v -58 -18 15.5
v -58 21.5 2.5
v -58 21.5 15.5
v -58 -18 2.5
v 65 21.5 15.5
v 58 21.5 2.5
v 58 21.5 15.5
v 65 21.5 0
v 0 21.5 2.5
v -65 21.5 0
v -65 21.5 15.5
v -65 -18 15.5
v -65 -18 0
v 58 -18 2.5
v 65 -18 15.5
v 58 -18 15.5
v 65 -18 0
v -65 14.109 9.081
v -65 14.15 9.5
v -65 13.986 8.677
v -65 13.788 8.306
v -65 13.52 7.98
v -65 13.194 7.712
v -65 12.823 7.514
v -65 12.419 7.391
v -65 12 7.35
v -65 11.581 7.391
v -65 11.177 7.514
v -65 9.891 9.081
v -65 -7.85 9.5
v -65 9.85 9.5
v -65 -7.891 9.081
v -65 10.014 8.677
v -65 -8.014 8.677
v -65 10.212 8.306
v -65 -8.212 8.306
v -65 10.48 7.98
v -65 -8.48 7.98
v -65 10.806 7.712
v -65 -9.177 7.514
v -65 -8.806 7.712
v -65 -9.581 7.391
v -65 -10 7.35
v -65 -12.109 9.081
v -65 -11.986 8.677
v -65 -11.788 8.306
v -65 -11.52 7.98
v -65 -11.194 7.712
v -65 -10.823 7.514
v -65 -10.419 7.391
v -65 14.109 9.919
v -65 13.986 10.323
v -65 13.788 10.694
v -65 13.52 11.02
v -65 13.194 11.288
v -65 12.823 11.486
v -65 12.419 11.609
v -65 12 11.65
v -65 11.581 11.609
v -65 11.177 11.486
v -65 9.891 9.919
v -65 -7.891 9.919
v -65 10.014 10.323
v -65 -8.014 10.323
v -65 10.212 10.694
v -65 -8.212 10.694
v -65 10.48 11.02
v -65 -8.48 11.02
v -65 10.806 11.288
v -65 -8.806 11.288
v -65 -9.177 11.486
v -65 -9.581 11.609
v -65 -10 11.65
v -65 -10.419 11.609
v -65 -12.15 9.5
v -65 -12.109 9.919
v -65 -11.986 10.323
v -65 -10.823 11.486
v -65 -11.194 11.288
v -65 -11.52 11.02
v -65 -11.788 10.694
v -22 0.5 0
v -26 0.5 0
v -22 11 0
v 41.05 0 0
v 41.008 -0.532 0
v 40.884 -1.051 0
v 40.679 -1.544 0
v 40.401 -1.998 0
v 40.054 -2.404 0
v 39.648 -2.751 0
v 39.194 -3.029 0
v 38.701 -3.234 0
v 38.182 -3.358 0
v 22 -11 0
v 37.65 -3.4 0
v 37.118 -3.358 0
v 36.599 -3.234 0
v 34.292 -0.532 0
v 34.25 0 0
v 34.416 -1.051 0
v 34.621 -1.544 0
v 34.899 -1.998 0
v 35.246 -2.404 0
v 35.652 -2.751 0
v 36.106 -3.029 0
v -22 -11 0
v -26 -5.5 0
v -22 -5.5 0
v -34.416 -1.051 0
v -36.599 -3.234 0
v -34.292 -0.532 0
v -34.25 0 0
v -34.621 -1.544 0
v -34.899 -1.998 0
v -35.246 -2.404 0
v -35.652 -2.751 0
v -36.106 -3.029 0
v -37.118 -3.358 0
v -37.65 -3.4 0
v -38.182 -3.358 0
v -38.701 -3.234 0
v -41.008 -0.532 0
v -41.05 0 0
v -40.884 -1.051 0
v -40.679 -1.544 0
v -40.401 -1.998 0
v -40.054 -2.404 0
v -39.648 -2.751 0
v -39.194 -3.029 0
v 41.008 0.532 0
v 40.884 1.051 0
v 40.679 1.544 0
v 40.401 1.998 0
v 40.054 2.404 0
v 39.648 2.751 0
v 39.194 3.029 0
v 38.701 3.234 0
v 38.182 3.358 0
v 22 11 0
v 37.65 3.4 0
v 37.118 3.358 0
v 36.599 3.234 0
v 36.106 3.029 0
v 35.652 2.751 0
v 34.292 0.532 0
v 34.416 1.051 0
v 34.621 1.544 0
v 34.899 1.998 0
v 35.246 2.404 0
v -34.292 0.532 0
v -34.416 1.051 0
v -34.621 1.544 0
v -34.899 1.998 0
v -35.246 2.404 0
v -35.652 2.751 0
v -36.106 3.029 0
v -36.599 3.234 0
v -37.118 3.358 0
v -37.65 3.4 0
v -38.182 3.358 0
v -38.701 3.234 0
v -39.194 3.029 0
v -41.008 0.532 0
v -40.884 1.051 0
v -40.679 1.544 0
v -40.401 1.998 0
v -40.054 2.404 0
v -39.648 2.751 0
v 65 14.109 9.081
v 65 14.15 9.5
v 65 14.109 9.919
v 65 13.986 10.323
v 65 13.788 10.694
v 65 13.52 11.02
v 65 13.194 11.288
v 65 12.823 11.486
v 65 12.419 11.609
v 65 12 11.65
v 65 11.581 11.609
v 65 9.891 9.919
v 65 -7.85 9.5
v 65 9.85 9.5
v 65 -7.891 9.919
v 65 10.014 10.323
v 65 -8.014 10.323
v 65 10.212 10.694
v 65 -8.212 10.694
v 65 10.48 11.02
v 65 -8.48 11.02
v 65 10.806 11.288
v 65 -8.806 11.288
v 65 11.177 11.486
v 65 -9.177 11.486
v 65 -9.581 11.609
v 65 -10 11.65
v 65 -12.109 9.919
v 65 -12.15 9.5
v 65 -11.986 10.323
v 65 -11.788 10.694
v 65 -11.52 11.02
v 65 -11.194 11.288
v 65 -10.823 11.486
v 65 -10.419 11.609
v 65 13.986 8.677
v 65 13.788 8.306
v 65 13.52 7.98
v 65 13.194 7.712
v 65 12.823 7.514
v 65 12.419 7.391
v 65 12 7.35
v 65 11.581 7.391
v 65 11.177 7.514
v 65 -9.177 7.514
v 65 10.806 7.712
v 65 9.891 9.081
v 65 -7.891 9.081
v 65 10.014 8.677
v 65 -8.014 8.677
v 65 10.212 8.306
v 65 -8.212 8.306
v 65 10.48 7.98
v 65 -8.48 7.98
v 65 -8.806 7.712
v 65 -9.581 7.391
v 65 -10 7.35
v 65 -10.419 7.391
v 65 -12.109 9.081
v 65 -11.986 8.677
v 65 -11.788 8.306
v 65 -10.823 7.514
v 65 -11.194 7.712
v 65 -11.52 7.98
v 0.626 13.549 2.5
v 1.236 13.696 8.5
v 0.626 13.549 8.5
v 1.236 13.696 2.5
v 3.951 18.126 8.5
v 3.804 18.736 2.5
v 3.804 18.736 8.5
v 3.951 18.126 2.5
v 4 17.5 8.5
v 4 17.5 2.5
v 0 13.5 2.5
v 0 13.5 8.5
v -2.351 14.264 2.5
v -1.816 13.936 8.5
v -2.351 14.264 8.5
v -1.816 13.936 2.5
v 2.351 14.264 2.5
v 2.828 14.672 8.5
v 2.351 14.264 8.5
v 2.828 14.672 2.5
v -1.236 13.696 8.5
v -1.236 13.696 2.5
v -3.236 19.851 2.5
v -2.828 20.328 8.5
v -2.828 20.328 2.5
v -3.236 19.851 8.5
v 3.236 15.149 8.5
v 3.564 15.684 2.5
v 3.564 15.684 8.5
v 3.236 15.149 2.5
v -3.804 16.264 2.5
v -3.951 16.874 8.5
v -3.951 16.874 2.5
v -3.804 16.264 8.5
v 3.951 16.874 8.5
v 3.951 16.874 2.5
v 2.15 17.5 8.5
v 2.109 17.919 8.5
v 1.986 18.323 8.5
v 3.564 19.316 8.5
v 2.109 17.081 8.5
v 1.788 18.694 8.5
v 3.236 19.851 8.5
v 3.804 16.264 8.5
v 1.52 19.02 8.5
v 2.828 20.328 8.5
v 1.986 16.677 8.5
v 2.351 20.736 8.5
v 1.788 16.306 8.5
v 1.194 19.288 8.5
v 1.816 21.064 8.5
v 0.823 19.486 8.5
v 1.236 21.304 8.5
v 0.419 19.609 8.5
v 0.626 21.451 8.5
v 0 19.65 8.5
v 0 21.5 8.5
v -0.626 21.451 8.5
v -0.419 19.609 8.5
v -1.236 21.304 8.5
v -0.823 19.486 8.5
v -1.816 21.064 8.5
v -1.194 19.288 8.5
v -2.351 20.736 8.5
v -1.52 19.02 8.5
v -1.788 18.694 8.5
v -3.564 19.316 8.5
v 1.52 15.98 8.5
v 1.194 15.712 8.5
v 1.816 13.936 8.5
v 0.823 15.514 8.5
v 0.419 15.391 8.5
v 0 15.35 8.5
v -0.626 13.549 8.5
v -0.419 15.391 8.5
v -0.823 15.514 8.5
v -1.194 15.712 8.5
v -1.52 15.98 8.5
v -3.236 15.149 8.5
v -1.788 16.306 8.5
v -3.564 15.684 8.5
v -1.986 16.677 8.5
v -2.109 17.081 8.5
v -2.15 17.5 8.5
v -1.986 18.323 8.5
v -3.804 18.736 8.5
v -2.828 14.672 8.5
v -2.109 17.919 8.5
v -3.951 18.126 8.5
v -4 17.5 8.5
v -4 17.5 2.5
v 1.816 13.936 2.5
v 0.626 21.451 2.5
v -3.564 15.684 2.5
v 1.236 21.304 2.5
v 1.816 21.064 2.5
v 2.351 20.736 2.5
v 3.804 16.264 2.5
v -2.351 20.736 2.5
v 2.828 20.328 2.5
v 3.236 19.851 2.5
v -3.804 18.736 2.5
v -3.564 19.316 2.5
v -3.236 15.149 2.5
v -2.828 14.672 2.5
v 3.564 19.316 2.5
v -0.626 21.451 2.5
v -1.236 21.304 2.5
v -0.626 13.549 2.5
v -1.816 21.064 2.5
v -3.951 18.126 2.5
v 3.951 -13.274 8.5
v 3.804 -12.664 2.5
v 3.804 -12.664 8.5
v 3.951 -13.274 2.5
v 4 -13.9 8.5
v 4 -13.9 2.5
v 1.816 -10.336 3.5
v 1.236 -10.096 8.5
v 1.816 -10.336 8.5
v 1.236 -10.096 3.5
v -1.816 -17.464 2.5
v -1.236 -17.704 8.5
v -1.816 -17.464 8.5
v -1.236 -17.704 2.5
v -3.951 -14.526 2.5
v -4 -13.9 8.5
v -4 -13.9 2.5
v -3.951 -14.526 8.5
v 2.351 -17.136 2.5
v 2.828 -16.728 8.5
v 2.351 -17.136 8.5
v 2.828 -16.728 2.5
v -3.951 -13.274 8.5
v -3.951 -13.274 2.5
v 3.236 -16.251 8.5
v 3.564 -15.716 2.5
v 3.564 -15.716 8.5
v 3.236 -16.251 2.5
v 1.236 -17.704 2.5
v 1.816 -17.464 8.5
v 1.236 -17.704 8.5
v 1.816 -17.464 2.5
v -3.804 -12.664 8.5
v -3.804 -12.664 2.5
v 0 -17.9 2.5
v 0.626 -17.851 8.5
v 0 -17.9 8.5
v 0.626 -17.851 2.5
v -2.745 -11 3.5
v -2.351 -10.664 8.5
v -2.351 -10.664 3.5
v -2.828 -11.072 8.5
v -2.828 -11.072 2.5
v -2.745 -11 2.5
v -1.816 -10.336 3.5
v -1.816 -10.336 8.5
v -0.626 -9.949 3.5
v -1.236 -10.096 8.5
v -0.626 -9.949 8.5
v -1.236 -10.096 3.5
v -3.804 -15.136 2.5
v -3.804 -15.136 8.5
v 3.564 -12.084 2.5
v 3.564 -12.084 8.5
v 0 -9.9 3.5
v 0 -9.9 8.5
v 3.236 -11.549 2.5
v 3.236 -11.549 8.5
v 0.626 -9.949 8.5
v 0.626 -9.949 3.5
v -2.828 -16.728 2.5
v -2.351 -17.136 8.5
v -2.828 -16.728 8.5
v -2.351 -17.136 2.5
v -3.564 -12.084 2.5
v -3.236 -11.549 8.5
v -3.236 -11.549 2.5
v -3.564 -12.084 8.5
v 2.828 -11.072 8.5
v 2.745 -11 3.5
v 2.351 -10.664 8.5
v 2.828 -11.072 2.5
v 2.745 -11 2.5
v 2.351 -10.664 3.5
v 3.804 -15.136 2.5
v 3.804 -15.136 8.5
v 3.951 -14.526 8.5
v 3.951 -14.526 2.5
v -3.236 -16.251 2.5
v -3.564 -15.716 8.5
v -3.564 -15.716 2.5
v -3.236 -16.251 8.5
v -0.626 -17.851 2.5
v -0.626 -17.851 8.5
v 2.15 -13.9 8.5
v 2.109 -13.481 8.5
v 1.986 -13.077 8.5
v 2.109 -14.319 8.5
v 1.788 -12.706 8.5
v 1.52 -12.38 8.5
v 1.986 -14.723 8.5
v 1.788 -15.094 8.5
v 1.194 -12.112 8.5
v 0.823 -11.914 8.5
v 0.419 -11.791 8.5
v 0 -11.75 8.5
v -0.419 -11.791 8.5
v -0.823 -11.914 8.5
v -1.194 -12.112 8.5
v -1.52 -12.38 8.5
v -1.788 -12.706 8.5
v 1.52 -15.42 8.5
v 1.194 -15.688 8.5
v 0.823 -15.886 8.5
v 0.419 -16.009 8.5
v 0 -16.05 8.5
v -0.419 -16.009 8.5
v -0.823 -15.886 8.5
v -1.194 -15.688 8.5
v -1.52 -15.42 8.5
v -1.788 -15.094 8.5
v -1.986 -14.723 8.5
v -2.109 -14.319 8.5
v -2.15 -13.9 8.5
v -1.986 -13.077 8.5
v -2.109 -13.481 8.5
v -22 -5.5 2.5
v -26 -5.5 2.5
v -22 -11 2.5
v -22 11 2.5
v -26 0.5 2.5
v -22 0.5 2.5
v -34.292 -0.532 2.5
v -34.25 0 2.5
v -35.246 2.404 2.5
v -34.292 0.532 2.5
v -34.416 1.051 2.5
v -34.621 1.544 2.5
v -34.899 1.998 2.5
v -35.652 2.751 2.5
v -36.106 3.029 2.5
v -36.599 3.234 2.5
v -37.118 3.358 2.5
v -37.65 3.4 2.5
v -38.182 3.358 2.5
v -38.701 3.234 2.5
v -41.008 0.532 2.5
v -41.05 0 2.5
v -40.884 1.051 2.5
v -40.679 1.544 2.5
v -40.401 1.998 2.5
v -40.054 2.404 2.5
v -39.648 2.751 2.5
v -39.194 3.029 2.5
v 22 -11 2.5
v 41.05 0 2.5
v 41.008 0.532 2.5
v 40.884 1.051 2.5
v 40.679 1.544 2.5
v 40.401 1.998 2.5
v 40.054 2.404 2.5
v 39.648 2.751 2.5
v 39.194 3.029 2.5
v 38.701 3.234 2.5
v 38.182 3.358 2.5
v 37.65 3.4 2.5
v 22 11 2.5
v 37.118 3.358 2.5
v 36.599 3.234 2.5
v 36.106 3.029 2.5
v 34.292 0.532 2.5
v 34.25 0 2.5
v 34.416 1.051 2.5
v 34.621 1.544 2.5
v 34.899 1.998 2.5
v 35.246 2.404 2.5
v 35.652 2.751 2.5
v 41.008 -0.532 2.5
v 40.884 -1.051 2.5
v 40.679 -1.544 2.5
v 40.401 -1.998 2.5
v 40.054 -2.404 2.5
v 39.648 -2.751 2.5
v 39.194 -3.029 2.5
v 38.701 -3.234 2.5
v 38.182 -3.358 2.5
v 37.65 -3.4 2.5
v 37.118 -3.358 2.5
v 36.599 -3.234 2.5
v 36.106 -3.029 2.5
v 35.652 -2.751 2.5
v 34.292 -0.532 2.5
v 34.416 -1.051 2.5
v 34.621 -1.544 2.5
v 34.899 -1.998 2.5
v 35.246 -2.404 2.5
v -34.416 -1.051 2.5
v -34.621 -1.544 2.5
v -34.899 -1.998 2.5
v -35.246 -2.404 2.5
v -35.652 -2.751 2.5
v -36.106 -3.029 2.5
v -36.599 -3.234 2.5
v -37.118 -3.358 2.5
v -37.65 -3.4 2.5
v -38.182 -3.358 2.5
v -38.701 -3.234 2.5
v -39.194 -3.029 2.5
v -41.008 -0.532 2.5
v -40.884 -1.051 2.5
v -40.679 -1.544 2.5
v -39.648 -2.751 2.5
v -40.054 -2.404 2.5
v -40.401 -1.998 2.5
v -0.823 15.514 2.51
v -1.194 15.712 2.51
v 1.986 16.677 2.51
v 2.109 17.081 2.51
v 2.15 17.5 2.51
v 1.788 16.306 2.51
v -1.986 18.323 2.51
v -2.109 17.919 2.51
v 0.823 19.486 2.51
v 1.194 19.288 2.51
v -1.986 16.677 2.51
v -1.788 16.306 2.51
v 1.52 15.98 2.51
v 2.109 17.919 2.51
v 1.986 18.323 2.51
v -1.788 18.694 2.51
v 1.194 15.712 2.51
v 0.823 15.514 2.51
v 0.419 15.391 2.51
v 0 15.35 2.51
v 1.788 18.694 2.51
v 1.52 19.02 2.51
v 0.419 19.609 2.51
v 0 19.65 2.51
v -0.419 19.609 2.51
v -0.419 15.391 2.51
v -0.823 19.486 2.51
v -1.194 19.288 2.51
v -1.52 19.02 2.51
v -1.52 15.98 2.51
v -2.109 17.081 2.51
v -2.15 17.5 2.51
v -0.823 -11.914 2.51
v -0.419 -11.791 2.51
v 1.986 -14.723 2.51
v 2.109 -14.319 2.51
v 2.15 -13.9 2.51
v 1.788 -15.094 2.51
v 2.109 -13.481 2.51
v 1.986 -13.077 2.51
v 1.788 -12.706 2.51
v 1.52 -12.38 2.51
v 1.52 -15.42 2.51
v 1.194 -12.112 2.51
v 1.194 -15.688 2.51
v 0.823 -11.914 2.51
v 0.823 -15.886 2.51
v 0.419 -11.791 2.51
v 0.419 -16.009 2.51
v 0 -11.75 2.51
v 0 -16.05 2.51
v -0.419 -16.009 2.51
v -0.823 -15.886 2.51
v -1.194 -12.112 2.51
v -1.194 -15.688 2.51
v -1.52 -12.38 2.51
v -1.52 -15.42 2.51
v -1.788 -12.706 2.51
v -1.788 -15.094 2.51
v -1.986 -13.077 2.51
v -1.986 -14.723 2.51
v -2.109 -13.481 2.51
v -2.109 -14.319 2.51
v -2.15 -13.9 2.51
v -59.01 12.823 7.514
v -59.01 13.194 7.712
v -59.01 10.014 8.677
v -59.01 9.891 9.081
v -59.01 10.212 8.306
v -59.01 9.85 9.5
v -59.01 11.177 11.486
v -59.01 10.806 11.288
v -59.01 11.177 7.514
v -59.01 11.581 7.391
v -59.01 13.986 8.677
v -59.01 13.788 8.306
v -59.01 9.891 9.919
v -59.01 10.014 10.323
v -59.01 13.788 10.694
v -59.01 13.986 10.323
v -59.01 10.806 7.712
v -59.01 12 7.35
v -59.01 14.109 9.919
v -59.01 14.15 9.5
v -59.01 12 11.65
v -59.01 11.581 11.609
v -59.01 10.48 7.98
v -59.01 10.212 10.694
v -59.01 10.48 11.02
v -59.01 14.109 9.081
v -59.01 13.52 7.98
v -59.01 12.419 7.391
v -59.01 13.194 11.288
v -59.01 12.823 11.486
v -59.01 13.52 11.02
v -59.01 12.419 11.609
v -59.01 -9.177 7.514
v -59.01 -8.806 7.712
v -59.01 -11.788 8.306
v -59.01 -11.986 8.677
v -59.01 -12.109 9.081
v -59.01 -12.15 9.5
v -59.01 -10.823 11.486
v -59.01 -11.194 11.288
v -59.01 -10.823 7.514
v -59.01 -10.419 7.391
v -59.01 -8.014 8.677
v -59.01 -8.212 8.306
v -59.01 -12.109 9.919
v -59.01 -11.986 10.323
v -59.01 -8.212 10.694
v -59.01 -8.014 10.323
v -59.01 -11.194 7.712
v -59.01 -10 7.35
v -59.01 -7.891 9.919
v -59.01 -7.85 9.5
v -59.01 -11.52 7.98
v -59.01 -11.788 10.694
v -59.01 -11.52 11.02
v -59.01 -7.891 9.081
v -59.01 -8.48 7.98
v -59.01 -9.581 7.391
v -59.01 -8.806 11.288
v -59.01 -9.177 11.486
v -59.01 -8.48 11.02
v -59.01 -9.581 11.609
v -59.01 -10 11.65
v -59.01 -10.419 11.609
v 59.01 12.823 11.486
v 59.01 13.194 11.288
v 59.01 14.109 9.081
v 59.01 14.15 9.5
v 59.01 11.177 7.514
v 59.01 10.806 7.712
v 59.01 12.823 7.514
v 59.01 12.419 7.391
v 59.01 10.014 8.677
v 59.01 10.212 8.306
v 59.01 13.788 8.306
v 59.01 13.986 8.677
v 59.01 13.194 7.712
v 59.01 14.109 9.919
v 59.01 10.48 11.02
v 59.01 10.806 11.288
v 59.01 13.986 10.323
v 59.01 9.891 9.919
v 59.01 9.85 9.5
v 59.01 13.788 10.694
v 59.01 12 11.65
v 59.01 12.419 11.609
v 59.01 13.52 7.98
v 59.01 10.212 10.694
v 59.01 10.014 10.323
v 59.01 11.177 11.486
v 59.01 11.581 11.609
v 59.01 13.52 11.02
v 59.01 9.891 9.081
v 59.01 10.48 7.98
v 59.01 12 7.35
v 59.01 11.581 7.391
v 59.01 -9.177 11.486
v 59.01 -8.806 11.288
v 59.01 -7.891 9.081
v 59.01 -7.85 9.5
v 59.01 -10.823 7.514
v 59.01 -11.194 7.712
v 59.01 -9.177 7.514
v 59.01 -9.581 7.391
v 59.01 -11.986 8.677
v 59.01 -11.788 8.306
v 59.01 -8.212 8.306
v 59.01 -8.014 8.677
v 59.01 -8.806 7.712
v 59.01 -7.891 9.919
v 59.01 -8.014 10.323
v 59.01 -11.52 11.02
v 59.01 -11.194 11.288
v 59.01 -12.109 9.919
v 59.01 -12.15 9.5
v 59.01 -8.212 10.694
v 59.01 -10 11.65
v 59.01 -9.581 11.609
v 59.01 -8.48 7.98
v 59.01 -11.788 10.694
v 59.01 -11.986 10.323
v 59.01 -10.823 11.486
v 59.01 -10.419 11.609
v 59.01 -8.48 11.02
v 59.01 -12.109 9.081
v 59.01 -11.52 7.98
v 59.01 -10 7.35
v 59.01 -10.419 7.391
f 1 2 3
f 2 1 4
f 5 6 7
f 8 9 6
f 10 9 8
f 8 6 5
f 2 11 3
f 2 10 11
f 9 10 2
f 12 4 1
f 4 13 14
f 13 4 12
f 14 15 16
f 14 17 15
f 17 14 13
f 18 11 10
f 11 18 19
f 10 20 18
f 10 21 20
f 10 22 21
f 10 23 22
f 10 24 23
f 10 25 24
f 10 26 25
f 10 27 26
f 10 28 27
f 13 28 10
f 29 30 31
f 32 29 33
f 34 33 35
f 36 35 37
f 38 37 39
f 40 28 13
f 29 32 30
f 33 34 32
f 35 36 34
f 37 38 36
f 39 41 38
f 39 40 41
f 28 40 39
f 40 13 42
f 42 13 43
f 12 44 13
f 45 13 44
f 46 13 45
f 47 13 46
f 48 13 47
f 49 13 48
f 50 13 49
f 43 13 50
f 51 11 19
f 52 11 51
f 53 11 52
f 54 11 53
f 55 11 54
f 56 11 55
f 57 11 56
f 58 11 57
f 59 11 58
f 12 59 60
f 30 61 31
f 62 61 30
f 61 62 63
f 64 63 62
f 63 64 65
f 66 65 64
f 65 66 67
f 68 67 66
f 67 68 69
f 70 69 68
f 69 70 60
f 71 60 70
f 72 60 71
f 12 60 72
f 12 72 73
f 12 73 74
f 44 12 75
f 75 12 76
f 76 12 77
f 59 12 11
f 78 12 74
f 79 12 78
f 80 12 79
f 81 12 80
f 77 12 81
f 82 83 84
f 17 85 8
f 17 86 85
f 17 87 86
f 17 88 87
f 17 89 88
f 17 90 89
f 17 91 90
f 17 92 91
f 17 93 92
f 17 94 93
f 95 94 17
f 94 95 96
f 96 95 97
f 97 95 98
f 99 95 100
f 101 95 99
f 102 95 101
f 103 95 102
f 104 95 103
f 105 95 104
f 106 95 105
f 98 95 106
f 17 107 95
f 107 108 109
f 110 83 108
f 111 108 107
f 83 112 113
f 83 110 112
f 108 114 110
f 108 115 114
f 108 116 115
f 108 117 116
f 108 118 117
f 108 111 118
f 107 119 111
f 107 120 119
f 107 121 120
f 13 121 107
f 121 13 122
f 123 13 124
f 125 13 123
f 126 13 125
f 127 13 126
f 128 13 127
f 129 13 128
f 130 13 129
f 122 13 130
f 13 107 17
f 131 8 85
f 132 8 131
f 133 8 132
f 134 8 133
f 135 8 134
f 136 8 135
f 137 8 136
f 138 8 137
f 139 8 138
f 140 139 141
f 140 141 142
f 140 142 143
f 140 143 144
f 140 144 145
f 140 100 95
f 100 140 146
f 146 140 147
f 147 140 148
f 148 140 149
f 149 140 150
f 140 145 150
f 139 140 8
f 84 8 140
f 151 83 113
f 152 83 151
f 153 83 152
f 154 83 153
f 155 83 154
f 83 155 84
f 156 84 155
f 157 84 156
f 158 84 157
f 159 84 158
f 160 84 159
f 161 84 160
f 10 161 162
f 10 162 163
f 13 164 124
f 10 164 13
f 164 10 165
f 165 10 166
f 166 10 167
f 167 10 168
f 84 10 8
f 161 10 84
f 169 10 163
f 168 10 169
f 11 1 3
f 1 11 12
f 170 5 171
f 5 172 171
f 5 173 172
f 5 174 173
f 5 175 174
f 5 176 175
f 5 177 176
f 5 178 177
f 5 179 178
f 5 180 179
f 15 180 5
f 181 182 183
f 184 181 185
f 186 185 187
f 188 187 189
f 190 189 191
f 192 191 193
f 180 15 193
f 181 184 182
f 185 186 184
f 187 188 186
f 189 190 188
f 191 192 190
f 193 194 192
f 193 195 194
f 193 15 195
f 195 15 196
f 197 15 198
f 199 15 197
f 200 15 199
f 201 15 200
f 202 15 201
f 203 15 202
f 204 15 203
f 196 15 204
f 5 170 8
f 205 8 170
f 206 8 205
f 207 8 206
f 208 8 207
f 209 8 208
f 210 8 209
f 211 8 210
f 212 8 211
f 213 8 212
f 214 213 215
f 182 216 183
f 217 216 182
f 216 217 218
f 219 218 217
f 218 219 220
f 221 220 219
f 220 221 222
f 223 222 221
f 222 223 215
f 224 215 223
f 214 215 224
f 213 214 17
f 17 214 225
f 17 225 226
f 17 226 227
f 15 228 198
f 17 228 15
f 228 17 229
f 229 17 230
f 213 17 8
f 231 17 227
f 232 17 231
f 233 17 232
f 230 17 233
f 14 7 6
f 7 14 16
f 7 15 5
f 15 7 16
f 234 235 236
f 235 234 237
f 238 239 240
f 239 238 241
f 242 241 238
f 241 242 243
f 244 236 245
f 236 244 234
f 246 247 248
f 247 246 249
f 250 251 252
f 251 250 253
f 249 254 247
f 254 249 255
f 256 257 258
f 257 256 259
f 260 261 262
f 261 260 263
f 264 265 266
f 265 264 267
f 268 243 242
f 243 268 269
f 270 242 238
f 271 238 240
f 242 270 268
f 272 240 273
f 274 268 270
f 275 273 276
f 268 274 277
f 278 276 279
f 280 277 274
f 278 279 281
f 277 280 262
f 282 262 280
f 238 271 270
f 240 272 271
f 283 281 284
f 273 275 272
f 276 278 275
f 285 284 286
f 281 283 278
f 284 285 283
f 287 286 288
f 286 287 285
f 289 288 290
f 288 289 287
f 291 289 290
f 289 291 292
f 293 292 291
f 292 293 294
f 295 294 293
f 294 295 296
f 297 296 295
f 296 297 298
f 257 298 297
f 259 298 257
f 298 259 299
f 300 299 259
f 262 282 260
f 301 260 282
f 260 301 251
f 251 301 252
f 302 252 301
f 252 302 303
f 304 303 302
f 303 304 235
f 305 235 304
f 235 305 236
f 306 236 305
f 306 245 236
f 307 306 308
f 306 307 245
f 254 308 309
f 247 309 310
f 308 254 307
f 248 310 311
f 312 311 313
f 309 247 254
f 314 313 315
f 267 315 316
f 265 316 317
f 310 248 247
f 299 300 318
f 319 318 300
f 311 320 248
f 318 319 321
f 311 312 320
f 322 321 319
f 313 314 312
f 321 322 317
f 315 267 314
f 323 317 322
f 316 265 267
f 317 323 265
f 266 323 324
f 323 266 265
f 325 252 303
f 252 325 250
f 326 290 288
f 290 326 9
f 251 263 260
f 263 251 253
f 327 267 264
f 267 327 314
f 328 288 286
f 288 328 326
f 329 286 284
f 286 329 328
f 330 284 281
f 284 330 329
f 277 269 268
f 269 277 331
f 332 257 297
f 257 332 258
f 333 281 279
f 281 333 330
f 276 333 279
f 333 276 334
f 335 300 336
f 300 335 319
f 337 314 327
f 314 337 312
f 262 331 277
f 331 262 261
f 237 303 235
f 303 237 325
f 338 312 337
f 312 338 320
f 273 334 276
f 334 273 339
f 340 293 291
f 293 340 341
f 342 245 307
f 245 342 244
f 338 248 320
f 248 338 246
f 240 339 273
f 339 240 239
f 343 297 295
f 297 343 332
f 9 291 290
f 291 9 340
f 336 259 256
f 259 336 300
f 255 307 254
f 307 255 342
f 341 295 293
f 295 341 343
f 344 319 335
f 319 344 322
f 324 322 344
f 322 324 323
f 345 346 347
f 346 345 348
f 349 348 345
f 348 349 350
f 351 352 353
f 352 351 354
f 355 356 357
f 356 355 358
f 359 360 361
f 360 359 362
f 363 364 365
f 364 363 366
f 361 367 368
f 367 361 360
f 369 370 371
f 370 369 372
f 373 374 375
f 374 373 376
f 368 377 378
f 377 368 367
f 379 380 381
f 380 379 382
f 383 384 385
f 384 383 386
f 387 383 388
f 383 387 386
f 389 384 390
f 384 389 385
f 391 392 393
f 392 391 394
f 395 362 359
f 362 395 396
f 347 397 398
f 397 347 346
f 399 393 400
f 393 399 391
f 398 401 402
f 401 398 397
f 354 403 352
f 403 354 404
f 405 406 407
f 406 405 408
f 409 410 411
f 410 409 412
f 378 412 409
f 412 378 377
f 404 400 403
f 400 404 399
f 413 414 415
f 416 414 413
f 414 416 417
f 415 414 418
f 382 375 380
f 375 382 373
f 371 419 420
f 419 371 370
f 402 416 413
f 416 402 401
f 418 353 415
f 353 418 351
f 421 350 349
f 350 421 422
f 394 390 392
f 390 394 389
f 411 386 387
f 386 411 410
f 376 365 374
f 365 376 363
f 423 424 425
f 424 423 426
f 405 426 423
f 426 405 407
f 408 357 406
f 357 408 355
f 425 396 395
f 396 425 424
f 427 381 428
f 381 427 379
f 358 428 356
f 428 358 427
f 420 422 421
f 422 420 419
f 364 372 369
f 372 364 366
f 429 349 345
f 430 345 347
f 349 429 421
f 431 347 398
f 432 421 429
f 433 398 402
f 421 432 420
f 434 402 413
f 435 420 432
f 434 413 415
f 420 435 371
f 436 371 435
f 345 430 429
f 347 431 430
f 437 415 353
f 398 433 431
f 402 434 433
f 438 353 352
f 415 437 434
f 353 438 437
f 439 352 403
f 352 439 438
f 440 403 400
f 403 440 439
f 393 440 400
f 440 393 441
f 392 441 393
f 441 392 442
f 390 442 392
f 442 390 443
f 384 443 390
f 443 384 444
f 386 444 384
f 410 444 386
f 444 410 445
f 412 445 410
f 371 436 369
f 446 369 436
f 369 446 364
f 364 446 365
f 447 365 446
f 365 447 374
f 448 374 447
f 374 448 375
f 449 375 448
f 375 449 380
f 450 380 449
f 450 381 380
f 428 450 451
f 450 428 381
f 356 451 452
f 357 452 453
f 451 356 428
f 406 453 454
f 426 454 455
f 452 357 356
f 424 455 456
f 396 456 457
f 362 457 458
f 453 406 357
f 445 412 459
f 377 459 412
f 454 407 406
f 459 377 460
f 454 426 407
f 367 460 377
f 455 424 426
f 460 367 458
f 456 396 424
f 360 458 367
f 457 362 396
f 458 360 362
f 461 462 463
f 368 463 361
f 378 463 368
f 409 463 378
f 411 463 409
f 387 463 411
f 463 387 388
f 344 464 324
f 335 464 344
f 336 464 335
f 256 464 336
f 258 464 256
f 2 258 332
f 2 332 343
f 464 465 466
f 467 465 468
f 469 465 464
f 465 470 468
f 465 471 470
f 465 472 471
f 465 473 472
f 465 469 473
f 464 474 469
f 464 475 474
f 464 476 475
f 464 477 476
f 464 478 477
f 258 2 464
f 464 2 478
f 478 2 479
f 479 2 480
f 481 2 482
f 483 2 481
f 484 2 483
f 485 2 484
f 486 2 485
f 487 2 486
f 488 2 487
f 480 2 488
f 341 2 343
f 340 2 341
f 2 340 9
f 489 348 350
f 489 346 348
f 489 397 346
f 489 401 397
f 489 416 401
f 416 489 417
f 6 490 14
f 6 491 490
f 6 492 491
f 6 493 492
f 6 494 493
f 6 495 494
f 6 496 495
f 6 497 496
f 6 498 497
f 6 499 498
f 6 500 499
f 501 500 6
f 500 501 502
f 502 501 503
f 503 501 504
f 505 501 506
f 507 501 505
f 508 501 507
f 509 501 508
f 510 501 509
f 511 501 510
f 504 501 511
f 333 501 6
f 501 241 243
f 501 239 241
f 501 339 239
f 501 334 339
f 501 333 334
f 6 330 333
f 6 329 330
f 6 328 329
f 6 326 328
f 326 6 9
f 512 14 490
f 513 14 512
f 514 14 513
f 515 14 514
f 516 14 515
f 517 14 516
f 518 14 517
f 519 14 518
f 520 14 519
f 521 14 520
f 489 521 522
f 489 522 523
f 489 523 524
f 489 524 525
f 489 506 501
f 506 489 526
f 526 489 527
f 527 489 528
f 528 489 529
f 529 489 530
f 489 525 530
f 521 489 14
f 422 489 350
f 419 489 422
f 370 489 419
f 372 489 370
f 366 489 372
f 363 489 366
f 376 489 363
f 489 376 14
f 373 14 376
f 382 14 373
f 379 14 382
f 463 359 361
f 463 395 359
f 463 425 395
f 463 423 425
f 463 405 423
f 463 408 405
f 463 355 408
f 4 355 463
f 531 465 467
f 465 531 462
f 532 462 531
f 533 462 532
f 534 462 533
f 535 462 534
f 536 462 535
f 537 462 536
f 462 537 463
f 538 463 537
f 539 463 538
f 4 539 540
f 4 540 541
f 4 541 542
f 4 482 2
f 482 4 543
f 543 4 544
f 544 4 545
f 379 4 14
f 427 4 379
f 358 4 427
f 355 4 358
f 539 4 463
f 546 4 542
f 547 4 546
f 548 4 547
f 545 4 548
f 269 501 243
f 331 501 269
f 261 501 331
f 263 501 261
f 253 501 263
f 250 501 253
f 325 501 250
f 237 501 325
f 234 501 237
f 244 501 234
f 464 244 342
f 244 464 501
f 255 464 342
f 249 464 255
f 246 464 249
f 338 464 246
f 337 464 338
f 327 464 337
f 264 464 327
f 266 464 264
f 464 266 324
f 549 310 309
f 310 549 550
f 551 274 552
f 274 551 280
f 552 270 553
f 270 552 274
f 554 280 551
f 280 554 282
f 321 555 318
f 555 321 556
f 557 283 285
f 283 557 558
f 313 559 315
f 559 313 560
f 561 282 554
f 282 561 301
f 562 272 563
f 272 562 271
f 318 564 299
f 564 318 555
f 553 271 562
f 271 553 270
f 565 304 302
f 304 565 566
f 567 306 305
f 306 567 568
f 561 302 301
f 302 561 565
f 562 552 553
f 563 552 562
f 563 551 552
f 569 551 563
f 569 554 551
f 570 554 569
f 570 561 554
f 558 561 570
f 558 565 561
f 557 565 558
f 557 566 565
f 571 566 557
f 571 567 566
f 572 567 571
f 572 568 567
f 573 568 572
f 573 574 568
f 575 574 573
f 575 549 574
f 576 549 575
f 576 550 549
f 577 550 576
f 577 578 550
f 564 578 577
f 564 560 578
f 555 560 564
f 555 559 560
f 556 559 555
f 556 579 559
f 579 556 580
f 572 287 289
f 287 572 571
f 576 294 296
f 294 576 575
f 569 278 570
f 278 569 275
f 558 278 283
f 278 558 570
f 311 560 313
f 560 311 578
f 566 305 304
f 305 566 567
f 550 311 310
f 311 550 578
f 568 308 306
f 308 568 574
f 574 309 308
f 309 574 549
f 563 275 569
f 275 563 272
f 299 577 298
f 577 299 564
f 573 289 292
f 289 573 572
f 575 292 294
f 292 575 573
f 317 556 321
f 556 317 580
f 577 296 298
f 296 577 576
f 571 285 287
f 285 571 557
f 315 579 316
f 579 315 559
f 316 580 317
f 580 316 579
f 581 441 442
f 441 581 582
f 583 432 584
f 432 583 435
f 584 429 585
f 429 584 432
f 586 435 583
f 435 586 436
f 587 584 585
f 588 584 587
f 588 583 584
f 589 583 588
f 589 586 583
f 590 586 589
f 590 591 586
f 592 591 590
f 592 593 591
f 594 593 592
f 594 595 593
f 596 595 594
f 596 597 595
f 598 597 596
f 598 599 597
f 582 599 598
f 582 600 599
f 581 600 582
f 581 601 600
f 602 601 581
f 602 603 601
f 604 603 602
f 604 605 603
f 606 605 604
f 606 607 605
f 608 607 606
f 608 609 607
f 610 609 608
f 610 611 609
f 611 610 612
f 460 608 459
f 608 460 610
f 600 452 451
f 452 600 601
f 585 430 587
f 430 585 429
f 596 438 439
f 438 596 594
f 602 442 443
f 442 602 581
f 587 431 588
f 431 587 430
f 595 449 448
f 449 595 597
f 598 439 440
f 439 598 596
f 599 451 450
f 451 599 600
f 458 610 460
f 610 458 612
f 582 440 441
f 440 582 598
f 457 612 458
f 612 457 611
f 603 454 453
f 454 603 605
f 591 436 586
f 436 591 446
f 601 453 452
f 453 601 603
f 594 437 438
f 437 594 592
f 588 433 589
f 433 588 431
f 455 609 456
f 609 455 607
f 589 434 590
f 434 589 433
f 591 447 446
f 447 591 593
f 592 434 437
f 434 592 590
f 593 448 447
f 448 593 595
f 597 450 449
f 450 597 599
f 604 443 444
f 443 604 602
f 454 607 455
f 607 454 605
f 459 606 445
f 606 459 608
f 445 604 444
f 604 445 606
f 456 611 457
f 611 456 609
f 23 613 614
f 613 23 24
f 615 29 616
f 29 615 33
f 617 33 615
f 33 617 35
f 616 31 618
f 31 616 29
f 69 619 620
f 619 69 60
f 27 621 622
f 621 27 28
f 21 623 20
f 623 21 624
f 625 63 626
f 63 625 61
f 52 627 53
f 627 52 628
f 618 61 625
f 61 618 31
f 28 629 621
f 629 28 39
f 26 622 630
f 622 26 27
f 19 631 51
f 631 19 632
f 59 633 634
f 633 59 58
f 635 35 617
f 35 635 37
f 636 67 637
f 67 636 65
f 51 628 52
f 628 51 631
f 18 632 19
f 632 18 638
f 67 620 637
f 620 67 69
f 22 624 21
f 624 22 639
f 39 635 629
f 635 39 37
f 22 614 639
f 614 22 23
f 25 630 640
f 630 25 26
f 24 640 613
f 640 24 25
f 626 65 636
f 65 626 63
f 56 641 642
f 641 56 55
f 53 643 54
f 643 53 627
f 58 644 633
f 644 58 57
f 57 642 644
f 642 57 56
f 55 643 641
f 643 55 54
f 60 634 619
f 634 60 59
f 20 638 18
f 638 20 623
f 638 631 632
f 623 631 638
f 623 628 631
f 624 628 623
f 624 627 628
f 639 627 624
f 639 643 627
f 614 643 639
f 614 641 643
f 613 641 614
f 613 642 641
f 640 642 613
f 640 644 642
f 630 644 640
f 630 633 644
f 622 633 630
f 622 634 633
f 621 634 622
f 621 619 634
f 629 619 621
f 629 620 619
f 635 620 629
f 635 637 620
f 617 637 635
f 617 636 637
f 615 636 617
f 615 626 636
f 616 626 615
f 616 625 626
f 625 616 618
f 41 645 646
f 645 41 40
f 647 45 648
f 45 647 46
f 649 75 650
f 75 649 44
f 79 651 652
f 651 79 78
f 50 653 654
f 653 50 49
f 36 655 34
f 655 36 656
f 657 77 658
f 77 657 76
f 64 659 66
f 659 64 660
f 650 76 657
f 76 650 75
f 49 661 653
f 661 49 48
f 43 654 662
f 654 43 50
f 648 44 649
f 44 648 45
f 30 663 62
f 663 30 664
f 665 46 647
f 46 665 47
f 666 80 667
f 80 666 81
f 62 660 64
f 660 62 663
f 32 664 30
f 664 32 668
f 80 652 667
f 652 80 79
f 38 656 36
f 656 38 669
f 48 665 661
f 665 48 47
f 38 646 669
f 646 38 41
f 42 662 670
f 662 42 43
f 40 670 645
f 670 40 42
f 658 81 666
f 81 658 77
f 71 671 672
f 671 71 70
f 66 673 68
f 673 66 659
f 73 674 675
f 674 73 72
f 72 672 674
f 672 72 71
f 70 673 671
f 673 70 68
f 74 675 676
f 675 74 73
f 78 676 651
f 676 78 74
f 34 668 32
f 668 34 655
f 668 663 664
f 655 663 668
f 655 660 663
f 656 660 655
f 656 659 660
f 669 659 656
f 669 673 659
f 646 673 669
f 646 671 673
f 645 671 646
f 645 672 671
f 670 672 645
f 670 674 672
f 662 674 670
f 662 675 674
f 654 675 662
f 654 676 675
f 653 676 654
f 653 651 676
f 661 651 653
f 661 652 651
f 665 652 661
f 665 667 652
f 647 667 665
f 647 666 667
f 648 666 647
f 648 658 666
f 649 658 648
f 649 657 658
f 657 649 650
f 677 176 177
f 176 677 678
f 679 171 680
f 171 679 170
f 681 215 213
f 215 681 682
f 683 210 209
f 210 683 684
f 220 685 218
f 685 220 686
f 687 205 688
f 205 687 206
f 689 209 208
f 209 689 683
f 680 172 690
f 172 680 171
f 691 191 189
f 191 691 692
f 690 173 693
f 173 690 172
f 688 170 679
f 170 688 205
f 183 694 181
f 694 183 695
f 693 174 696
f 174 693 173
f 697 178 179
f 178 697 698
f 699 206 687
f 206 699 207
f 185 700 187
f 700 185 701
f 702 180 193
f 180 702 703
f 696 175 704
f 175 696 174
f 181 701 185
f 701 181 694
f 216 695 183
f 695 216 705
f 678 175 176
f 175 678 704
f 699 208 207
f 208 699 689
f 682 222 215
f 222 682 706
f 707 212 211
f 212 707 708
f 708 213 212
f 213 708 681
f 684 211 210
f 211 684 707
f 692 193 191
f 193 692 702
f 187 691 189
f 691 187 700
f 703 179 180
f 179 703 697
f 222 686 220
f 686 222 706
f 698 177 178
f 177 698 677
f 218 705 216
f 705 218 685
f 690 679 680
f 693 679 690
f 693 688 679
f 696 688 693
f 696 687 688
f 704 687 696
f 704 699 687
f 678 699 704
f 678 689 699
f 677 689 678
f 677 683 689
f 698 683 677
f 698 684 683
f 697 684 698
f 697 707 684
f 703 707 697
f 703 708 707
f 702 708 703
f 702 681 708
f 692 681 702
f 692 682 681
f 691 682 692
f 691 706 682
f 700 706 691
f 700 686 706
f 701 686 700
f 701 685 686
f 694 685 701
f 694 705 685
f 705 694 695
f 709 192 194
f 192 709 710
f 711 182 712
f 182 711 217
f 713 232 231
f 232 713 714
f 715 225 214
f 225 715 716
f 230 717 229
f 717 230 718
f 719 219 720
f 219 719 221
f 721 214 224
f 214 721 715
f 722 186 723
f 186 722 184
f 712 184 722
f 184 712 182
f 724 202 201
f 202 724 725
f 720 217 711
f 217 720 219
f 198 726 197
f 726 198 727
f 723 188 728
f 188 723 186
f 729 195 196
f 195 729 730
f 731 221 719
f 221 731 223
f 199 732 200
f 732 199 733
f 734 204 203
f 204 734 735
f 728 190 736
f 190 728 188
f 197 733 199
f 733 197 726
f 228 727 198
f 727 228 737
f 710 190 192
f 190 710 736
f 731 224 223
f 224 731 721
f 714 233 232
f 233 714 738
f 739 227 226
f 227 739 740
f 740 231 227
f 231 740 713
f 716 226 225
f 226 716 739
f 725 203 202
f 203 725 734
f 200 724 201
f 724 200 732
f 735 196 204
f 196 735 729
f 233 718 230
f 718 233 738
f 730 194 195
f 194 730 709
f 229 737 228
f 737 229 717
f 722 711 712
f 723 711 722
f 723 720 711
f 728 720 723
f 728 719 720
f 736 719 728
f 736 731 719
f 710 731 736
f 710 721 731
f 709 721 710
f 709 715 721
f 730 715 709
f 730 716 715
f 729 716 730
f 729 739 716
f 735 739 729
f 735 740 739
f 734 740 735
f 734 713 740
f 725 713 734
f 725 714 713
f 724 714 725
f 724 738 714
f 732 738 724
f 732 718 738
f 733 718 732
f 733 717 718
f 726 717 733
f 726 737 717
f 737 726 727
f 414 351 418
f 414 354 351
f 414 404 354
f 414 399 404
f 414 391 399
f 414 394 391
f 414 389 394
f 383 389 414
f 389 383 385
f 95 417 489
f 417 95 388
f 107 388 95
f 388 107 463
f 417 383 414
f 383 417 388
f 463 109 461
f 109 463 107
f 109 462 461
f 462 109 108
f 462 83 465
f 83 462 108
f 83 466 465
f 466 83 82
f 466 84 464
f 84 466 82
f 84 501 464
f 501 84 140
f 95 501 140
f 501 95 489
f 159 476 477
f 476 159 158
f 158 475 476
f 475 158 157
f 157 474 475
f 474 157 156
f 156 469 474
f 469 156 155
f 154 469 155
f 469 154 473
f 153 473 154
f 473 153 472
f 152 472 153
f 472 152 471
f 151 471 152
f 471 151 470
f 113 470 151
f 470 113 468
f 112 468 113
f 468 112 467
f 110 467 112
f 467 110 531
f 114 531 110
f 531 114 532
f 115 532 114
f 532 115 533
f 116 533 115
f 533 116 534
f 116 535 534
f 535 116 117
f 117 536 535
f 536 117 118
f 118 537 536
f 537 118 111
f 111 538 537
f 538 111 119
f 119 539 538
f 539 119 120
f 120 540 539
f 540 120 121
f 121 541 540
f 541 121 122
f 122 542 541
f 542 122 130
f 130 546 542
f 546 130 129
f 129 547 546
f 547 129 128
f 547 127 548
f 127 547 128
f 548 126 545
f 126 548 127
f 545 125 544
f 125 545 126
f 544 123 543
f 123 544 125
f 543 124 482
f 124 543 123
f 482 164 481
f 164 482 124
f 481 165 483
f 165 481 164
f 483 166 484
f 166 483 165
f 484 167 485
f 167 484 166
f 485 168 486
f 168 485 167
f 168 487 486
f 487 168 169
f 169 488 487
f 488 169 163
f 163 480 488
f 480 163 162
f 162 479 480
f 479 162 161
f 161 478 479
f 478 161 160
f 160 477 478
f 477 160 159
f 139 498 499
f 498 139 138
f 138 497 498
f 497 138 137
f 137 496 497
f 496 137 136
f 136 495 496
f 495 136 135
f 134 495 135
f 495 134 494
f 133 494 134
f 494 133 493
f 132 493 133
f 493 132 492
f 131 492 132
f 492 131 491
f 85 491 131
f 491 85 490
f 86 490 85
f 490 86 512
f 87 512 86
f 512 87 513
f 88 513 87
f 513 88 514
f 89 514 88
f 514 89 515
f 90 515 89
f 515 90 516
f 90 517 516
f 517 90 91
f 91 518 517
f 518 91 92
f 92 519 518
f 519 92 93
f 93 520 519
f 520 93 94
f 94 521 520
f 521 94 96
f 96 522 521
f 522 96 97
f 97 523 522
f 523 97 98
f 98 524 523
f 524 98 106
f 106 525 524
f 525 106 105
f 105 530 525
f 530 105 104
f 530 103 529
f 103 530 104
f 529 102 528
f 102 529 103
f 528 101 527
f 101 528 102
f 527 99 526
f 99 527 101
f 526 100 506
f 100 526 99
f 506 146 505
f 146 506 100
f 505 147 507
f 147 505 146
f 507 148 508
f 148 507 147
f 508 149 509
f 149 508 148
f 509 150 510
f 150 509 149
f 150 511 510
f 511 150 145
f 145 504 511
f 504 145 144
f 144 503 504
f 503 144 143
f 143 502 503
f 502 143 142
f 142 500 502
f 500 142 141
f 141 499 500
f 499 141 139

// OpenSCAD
// file: ../../head.scad
// Head - shared dimensions for the face plate, shell, camera plate and floor (concept:
// concepts/head_brow_concept.scad). The head sits straight on the turntable plate, no neck.
//
// Frame: origin at the centre of the turntable plate's top; +Y = front (face), +Z = up.
//
//   FACE   head_face.scad: the front of the box part - two round GC9A01 eyes and the 2.08" OLED
//          mouth, each dropped into a pocket from behind (it centres them) and hot-glued
//   SHELL  head_shell.scad: sides, back and the ARCH on top (a half cylinder across the full width
//          and depth); the camera looks out of a small window in the arch's front curve
//   CAMERA head_cam_plate.scad: holds the bare C920 board at cam_tilt, screwed inside the arch
//   FLOOR  head_floor.scad: screws to the turntable plate; the head ESP32-S3 sits on it
include <params.scad>

// ---- outline ------------------------------------------------------------------------------------
hb_w     = 135;              // width (X)
hb_d     = 70;               // depth (Y)
box_h    = 88;               // the box part (face height); the arch adds arch_r on top -> 123
hb_r     = 20;               // bottom corners, seen from the front (the top meets the arch square)
hb_wall  = 2.5;              // shell walls
arch_r   = hb_d / 2;         // 35: the arch spans the full depth; its axis runs along X at
arch_z   = box_h;            //   y = 0, z = box_h
face_t   = 3.0;              // face plate
face_y   = hb_d / 2;         // 35: front surface of the face

// ---- eyes (module dims: params.scad eye_*) ------------------------------------------------------
eye_dx    = 32;              // eye centres at x = +/- eye_dx
eye_z     = 55;              // eye centre height. Modules mount UPSIDE DOWN (pin tab up; the image
                             //   is flipped in software): the tab then points into the free space
                             //   under the arch, away from the mouth
eye_win   = 34;              // window: the 32.4 mm picture + a thin black margin of glass; hides the
                             //   glass edge and its flex cable
eye_skin  = 1.2;             // face material in front of the display
eye_pocket = eye_board_d + 0.5;     // the board drops into this and centres the display
eye_depth = eye_t + 0.3;     // pocket depth behind the skin

// ---- mouth: 2.08" OLED (params.scad oled_*) ---------------------------------------------------------
mouth_z   = 23;              // centre of the visible area: the module's lower edge clears the floor's tabs
mouth_pin = -1;              // the module's pin end points to -X (seen from the front: the left)
m_win     = oled_va + [0.6, 0.6];   // window: the visible area + 0.3 each side
m_skin    = 1.2;
// along X, from the visible area's centre: the glass's and the board's centres (pins at -X)
m_glass_dx = -mouth_pin * (oled_glass_x + oled_glass[0] / 2 - (oled_va_x + oled_va[0] / 2));   // +2.56
m_pcb_dx   = -mouth_pin * (oled_pcb[0] / 2 - (oled_va_x + oled_va[0] / 2));                     // +1.82

// ---- camera: bare C920 board, in the arch ----------------------------------------------------------
cam_tilt  = 18;              // fixed, up. Lens ~278 mm above the desk: eyes 300-500 mm high at
                             //   300-600 mm are 2..37 deg up; the 43 deg view (16:9) at 18 covers -3..40
cam_board = [80, 22];        // MEASURED (eye_test_stand.scad)
cam_board_t = 1.3;
cam_lens_h  = 14.0;          // board front -> front of the lens
cam_lens_d  = 11;            // lens barrel across its flanges
cam_win     = cam_lens_d + 2 * 2;   // window round the lens (eye test stand, print 2: small is best)
cam_recess  = 0.5;           // lens front this far inside the arch's surface
// the lens axis runs radially out of the arch at cam_tilt: lens front at arch_r - cam_recess
cam_r_lens  = arch_r - cam_recess;                  // 34.5 from the arch axis
cam_r_board = cam_r_lens - cam_lens_h;              // 20.5: board front

// ---- joints -------------------------------------------------------------------------------------------
// face plate -> shell: four M3 screws from inside, through tabs on the shell, into inserts in the
// face's bosses
face_boss_d   = 8;
face_boss_len = 9;           // behind the face's back
face_bosses   = [[-55, 14], [55, 14], [-58, 64], [58, 64]];   // (x, z): the upper pair low enough to
                                                                //   clear the camera plate's flanges

// floor: head_floor.scad. It screws DOWN into four inserts in the turntable plate (head-frame
// positions below); the shell hooks onto it at the front (two tongues on the face plate into slots
// in the floor's front tabs) and screws to it at the back (two M3 through the back wall)
floor_t      = 4.5;          // pockets underneath clear the lazy Susan's M5 nuts + bolt tips
floor_clr    = 0.4;          // gap to the shell's walls, each side
floor_x      = 47;           // half-width: the shell's open bottom is +/-47.5 (rounded corners)
floor_y      = [-hb_d / 2 + hb_wall + floor_clr, face_y - face_t - floor_clr];
floor_mounts = [[-22, -22], [22, -22], [-22, 22], [22, 22]];  // M3 down into the turntable plate
head_rot_in_pulley = 45;     // the head's frame in turntable_pulley.scad's: there the motor is at 0 deg
                             //   when the head looks ahead, and Level 2 has it at motor_a = -45, so the
                             //   head's +Y (90 deg) is at 135
floor_nuts   = [[-50.5, 0], [50.5, 0]];   // the turntable plate's M5 nuts under the floor
floor_hole_d = 40;           // cables down into the turntable's hollow tube
back_screws  = [-30, 30];    // x of the two M3 screws through the back wall
back_screw_z = 10;
tongue_x     = [-30, 30];    // the face plate's tongues
tongue       = [10, 3, 7];   // width (X), height (Z), length (Y, back from the face plate)
tongue_z     = 7;            // centre height (under the mouth's collar)
// the head ESP32-S3 (Seeed XIAO ESP32S3, 21 x 17.8): in a pocket on the floor, USB-C toward the hole
mcu          = [21.0, 17.8];
mcu_c        = [33, 0];      // centre; long axis along X, USB at the -X end

module rr2d(w, h, r) { offset(r = r) square([w - 2 * r, h - 2 * r], center = true); }

// front outline of the box part: rounded bottom corners, square top; z = 0 .. h
module low2d(w = hb_w, h = box_h, r = hb_r) {
    hull() {
        for (sx = [-1, 1]) translate([sx * (w / 2 - r), r]) circle(r = r, $fn = 96);
        translate([-w / 2, h - 1]) square([w, 1]);
    }
}

// where the lens sits: frame at the lens front, looking along +Y (rotated cam_tilt up)
module at_lens() {
    translate([0, 0, arch_z]) rotate([cam_tilt, 0, 0]) translate([0, cam_r_lens, 0]) children();
}
// file: ../../head_cam.scad
// Head camera mount - shared by head_cam_plate.scad, head_cam_strap.scad and head_shell.scad.
//
// LENS FRAME: origin at the front of the lens; +Y = the view direction, +Z = "up" across the
// board, X = along the board (same X as the head). at_lens() (head.scad) places it in the head:
// the lens axis runs radially out of the arch, cam_tilt up.
//
// The bare C920 board (80 x 22) lies against the plate's BACK face, lens forward through it, as on
// the eye test stand (eye_test_stand.scad - its pocket / notch / bracket layout is proven):
//   * through the plate: the lens holder (square), the board's front parts (44 x 22), the coils'
//     bay, two notches for the microphones (they also index the board side to side)
//   * behind: two bosses with M3 inserts; a flat strap (head_cam_strap.scad) screws onto them
//     across the board's back, 1.7 mm clear of its back parts
//   * at each end a FLANGE against the side wall: two M3 screws from outside the head, through
//     the wall, into inserts in the flange
include <head.scad>

cam_plate_t  = 2.5;
cam_y_board  = -cam_lens_h;                 // -14: board front = plate back face
cam_y_front  = cam_y_board + cam_plate_t;   // -11.5: plate front face
cam_z_range  = [-18, 21.5];                 // plate extent across the board (Z): inside the arch
cam_x_flange = hb_w / 2 - hb_wall;          // 65: flange outer faces against the side walls
cam_flange_t = 7;                           // thick enough for an insert (bore along X)
cam_flange_y = [-27, cam_y_front];          // flange extent along Y
cam_mount_pts = [[-21, 12], [-21, -10]];    // [y, z] of the two screws in each flange
cam_lens_hole = 16.5;                       // square, for the 14 x 14 lens holder
cam_comp     = [44, 22];                    // the board's front parts (through)
cam_coil     = [4, 5];                      // bay off the pocket's -X side, from z = 0 up
cam_mic_d    = 6.1 + 0.7;
cam_mic_x    = 69.2 / 2 + 6.1 / 2;          // 37.65: microphone centres
cam_strap_holes = [17.5, -13.9];            // Z of the strap's screws (as the stand's bracket)
cam_boss_h   = 6;                           // bosses behind the plate: the strap lies on them
cam_boss_d   = 8;

// a point in the lens frame -> head frame (matches at_lens())
function cam_to_head(p) = let(y = p[1] + cam_r_lens, z = p[2])
    [p[0], y * cos(cam_tilt) - z * sin(cam_tilt), arch_z + y * sin(cam_tilt) + z * cos(cam_tilt)];
// main file
// Head camera plate - holds the bare C920 board in the arch, cam_tilt up, with its lens 0.5 mm
// inside the arch's window. See head_cam.scad for the layout. Fit: board onto the back face (mics
// into their notches), strap over it (head_cam_strap.scad, 2 x M3 into the bosses), USB wires round
// the board's top edge; then the plate into the shell from below, and four M3 x 10 screws from
// outside through the side walls into the flanges.
//
// PRINT front face down (as modelled in print orientation below): bosses and flanges stand up,
// no supports.
include <../../head_cam.scad>

module cam_plate() {               // in the LENS frame
    difference() {
        union() {
            // the plate
            translate([-cam_x_flange + cam_flange_t, cam_y_board, cam_z_range[0]])
                cube([2 * (cam_x_flange - cam_flange_t), cam_plate_t, cam_z_range[1] - cam_z_range[0]]);
            // flanges against the side walls
            for (sx = [-1, 1]) translate([sx > 0 ? cam_x_flange - cam_flange_t : -cam_x_flange, cam_flange_y[0], cam_z_range[0]])
                cube([cam_flange_t, cam_flange_y[1] - cam_flange_y[0], cam_z_range[1] - cam_z_range[0]]);
            // strap bosses behind the plate
            for (z = cam_strap_holes) translate([0, cam_y_board + 0.01, z]) rotate([90, 0, 0])
                cylinder(d = cam_boss_d, h = cam_boss_h + 0.01, $fn = 40);
        }
        // lens holder, the board's front parts, coils, microphones: through the plate
        translate([0, cam_y_board - 1, 0]) rotate([-90, 0, 0]) linear_extrude(cam_plate_t + 2) {
            square(cam_lens_hole, center = true);
            square(cam_comp, center = true);
            translate([-cam_comp[0] / 2 - cam_coil[0], -0.5]) square([cam_coil[0] + 1, cam_coil[1] + 1]);
            for (sx = [-1, 1]) translate([sx * cam_mic_x, 0]) circle(d = cam_mic_d, $fn = 40);
        }
        // strap inserts (bore from the boss tops)
        for (z = cam_strap_holes) translate([0, cam_y_board - cam_boss_h - 0.01, z]) rotate([-90, 0, 0])
            cylinder(d = insert_m3[0], h = insert_m3[1] + 1, $fn = 32);
        // flange inserts (bore from the outer faces, along X)
        for (sx = [-1, 1], p = cam_mount_pts) translate([sx * (cam_x_flange + 0.01), p[0], p[1]])
            rotate([0, -sx * 90, 0]) cylinder(d = insert_m3[0], h = insert_m3[1] + 1, $fn = 32);
    }
}

// as printed: front face (lens frame +Y side) down
rotate([-90, 0, 0]) translate([0, -cam_y_front, 0]) cam_plate();

// ghost: the board in place
%rotate([-90, 0, 0]) translate([0, -cam_y_front, 0])
    translate([-cam_board[0] / 2, cam_y_board - cam_board_t, -cam_board[1] / 2]) cube([cam_board[0], cam_board_t, cam_board[1]]);
